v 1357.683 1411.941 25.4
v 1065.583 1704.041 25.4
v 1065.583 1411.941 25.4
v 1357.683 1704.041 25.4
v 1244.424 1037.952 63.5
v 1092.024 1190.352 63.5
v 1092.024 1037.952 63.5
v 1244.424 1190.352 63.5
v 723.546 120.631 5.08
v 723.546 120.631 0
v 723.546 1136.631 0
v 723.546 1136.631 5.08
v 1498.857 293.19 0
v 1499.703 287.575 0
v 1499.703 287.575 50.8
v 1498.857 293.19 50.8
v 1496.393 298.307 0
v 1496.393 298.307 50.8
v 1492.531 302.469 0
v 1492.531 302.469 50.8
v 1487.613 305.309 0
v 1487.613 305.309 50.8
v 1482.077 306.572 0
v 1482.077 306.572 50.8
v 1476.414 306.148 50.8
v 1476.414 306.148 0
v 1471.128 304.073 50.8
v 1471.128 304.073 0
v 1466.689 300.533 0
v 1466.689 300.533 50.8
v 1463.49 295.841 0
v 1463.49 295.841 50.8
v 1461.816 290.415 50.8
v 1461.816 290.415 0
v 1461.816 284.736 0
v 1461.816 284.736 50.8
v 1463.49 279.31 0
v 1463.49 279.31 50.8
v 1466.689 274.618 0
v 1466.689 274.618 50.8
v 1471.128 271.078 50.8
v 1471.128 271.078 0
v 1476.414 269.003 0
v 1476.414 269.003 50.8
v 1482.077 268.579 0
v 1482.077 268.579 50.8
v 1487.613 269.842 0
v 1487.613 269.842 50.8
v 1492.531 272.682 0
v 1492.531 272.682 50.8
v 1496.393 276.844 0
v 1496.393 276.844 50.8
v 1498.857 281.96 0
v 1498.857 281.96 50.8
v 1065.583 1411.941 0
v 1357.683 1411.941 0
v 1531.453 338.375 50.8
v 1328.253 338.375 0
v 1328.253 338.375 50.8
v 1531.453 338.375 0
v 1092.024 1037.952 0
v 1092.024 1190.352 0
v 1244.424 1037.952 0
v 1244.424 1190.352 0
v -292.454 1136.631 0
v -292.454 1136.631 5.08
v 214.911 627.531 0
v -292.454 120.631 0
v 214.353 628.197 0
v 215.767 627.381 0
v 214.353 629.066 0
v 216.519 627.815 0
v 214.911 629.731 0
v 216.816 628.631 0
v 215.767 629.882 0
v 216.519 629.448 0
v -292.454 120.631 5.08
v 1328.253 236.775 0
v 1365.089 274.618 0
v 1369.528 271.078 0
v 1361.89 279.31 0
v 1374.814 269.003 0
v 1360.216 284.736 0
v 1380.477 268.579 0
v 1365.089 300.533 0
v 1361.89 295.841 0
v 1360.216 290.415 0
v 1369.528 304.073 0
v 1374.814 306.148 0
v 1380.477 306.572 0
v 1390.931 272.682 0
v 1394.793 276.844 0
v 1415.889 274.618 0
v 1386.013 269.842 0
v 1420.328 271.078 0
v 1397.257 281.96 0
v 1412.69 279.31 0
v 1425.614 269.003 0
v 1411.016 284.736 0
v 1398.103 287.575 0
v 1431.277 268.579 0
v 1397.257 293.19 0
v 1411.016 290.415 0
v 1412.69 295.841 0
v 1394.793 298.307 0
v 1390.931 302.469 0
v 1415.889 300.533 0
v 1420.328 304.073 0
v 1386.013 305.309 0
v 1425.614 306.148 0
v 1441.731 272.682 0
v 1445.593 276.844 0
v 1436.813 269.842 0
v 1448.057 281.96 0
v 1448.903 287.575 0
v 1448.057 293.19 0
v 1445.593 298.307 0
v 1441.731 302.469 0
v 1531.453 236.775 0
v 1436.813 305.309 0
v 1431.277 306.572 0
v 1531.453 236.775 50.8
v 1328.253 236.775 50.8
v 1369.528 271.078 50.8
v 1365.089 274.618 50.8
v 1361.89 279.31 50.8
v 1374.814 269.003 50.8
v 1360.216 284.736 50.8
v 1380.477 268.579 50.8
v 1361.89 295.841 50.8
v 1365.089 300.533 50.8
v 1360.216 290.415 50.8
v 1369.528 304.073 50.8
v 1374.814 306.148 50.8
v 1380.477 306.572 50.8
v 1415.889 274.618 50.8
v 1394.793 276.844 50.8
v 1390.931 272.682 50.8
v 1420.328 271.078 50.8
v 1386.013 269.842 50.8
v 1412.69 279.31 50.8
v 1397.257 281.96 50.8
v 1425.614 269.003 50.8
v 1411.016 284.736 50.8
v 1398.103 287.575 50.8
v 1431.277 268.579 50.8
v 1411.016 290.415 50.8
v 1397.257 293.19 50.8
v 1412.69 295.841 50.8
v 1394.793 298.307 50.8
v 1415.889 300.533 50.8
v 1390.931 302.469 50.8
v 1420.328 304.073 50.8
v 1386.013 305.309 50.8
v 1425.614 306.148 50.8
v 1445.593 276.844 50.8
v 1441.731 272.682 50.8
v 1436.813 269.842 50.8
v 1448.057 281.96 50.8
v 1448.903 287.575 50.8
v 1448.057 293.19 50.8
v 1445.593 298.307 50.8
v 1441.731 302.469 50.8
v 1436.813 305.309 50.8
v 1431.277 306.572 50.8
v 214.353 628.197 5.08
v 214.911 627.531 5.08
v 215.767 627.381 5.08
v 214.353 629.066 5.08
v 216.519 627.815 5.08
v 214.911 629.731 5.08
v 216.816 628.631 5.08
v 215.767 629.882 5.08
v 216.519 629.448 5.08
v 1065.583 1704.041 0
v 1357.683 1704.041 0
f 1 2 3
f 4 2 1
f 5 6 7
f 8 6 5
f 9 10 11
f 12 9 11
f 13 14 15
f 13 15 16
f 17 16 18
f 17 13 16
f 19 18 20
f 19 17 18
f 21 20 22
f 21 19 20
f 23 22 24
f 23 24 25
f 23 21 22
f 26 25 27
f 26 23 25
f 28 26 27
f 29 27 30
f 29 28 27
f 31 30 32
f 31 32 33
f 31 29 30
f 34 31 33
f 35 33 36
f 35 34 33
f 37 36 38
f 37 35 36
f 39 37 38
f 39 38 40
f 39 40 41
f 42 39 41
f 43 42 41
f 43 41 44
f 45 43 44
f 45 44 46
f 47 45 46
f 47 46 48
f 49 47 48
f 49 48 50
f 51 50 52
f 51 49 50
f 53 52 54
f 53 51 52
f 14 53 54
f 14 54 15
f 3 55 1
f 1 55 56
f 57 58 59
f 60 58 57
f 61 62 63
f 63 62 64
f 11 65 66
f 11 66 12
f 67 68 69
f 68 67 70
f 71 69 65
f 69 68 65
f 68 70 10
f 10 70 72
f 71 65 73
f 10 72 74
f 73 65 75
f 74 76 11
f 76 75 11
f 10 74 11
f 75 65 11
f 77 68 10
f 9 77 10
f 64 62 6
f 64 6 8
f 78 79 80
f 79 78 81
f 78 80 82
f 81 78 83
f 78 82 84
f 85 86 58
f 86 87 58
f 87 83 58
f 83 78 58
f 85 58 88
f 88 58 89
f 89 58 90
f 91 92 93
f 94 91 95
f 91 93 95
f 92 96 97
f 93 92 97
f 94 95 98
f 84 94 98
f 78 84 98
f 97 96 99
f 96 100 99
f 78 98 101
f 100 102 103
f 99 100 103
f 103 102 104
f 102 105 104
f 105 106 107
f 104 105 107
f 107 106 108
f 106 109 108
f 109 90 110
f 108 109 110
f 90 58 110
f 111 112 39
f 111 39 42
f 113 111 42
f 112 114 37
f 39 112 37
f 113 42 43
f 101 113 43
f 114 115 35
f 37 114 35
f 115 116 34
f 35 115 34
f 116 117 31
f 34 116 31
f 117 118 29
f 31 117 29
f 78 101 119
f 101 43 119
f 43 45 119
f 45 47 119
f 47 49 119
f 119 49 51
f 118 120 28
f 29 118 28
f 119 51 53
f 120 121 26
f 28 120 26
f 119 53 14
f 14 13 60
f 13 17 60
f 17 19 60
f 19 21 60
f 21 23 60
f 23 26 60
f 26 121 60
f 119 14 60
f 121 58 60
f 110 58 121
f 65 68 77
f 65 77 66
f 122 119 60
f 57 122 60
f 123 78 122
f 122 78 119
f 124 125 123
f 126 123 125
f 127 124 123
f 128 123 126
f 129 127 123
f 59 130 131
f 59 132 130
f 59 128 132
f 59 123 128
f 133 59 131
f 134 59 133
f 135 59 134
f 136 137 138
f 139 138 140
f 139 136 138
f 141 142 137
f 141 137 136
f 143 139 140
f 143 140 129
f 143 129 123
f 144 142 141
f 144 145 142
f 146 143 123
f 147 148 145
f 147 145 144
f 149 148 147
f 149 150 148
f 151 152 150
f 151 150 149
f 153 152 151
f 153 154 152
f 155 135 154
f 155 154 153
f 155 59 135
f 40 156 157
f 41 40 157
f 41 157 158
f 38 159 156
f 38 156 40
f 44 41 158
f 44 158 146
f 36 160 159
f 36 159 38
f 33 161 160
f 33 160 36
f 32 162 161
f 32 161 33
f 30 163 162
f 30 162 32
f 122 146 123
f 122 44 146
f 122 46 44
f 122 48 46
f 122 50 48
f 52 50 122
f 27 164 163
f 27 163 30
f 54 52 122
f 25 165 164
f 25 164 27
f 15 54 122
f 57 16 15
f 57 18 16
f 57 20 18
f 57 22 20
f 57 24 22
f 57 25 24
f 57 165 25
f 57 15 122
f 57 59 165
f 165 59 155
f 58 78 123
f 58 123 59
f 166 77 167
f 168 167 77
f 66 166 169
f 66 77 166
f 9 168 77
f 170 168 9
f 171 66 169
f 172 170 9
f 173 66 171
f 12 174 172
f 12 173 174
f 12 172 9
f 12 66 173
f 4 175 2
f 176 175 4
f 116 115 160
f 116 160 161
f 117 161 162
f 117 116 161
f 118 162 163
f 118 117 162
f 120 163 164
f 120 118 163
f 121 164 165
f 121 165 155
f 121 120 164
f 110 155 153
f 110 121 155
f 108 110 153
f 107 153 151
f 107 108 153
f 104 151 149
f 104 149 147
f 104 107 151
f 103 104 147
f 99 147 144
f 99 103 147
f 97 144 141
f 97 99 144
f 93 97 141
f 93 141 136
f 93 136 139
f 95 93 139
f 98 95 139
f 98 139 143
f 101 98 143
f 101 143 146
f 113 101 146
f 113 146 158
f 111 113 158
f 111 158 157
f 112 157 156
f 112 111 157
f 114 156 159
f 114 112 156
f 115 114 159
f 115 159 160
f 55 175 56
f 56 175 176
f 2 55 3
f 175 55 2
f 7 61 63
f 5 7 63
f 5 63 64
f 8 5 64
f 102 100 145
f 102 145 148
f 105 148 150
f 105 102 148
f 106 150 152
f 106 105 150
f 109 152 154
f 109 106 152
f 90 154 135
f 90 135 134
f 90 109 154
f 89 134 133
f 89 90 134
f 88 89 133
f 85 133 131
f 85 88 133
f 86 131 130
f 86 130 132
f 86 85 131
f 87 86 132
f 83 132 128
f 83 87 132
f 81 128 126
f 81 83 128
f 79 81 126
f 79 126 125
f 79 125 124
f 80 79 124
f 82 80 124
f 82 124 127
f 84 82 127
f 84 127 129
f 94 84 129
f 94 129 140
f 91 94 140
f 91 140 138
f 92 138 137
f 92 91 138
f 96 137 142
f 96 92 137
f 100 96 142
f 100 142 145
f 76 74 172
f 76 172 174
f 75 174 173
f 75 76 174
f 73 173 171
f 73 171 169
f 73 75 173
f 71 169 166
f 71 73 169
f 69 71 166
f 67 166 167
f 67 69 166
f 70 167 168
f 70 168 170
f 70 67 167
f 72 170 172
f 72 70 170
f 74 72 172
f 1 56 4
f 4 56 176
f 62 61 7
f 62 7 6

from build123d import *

# Parameters (mm, degrees)
F0_W     = 292.1
F0_H     = 292.1
F1_DEPTH = 25.4
F0_W_2   = 152.4
F0_H_2   = 152.4
F2_DEPTH = 63.5
F0_W_3   = 1016
F0_H_3   = 1016
F0_R     = 1.27
F3_DEPTH = 5.08
F4_W     = 203.2
F4_H     = 101.6
F4_R     = 19.05
F5_DEPTH = 50.8


with BuildPart() as f1:
    # F0 (on Top) → F1 (new body)
    with BuildSketch(Plane.XY):
        with Locations((1211.633325, 1557.991385)):
            Rectangle(F0_W, F0_H)
    extrude(amount=F1_DEPTH)


with BuildPart() as f2:
    # F0 (on Top) → F2 (new body)
    with BuildSketch(Plane.XY):
        with Locations((1168.224207, 1114.151708)):
            Rectangle(F0_W_2, F0_H_2)
    extrude(amount=F2_DEPTH)


with BuildPart() as f3:
    # F0 (on Top) → F3 (new body)
    with BuildSketch(Plane.XY):
        with Locations((215.546204, 628.631345)):
            Rectangle(F0_W_3, F0_H_3)
        with Locations((215.546204, 628.631345)):
            Circle(F0_R, mode=Mode.SUBTRACT)
    extrude(amount=F3_DEPTH)


with BuildPart() as f5:
    # F4 (on Top) → F5 (new body)
    with BuildSketch(Plane.XY):
        with Locations((1429.853269, 287.575413)):
            Rectangle(F4_W, F4_H)
        with Locations((1379.053269, 287.575413)):
            Circle(F4_R, mode=Mode.SUBTRACT)
        with Locations((1429.853269, 287.575413)):
            Circle(F4_R, mode=Mode.SUBTRACT)
        with Locations((1480.653269, 287.575413)):
            Circle(F4_R, mode=Mode.SUBTRACT)
    extrude(amount=F5_DEPTH)


solid = Compound([f1.part, f2.part, f3.part, f5.part])
